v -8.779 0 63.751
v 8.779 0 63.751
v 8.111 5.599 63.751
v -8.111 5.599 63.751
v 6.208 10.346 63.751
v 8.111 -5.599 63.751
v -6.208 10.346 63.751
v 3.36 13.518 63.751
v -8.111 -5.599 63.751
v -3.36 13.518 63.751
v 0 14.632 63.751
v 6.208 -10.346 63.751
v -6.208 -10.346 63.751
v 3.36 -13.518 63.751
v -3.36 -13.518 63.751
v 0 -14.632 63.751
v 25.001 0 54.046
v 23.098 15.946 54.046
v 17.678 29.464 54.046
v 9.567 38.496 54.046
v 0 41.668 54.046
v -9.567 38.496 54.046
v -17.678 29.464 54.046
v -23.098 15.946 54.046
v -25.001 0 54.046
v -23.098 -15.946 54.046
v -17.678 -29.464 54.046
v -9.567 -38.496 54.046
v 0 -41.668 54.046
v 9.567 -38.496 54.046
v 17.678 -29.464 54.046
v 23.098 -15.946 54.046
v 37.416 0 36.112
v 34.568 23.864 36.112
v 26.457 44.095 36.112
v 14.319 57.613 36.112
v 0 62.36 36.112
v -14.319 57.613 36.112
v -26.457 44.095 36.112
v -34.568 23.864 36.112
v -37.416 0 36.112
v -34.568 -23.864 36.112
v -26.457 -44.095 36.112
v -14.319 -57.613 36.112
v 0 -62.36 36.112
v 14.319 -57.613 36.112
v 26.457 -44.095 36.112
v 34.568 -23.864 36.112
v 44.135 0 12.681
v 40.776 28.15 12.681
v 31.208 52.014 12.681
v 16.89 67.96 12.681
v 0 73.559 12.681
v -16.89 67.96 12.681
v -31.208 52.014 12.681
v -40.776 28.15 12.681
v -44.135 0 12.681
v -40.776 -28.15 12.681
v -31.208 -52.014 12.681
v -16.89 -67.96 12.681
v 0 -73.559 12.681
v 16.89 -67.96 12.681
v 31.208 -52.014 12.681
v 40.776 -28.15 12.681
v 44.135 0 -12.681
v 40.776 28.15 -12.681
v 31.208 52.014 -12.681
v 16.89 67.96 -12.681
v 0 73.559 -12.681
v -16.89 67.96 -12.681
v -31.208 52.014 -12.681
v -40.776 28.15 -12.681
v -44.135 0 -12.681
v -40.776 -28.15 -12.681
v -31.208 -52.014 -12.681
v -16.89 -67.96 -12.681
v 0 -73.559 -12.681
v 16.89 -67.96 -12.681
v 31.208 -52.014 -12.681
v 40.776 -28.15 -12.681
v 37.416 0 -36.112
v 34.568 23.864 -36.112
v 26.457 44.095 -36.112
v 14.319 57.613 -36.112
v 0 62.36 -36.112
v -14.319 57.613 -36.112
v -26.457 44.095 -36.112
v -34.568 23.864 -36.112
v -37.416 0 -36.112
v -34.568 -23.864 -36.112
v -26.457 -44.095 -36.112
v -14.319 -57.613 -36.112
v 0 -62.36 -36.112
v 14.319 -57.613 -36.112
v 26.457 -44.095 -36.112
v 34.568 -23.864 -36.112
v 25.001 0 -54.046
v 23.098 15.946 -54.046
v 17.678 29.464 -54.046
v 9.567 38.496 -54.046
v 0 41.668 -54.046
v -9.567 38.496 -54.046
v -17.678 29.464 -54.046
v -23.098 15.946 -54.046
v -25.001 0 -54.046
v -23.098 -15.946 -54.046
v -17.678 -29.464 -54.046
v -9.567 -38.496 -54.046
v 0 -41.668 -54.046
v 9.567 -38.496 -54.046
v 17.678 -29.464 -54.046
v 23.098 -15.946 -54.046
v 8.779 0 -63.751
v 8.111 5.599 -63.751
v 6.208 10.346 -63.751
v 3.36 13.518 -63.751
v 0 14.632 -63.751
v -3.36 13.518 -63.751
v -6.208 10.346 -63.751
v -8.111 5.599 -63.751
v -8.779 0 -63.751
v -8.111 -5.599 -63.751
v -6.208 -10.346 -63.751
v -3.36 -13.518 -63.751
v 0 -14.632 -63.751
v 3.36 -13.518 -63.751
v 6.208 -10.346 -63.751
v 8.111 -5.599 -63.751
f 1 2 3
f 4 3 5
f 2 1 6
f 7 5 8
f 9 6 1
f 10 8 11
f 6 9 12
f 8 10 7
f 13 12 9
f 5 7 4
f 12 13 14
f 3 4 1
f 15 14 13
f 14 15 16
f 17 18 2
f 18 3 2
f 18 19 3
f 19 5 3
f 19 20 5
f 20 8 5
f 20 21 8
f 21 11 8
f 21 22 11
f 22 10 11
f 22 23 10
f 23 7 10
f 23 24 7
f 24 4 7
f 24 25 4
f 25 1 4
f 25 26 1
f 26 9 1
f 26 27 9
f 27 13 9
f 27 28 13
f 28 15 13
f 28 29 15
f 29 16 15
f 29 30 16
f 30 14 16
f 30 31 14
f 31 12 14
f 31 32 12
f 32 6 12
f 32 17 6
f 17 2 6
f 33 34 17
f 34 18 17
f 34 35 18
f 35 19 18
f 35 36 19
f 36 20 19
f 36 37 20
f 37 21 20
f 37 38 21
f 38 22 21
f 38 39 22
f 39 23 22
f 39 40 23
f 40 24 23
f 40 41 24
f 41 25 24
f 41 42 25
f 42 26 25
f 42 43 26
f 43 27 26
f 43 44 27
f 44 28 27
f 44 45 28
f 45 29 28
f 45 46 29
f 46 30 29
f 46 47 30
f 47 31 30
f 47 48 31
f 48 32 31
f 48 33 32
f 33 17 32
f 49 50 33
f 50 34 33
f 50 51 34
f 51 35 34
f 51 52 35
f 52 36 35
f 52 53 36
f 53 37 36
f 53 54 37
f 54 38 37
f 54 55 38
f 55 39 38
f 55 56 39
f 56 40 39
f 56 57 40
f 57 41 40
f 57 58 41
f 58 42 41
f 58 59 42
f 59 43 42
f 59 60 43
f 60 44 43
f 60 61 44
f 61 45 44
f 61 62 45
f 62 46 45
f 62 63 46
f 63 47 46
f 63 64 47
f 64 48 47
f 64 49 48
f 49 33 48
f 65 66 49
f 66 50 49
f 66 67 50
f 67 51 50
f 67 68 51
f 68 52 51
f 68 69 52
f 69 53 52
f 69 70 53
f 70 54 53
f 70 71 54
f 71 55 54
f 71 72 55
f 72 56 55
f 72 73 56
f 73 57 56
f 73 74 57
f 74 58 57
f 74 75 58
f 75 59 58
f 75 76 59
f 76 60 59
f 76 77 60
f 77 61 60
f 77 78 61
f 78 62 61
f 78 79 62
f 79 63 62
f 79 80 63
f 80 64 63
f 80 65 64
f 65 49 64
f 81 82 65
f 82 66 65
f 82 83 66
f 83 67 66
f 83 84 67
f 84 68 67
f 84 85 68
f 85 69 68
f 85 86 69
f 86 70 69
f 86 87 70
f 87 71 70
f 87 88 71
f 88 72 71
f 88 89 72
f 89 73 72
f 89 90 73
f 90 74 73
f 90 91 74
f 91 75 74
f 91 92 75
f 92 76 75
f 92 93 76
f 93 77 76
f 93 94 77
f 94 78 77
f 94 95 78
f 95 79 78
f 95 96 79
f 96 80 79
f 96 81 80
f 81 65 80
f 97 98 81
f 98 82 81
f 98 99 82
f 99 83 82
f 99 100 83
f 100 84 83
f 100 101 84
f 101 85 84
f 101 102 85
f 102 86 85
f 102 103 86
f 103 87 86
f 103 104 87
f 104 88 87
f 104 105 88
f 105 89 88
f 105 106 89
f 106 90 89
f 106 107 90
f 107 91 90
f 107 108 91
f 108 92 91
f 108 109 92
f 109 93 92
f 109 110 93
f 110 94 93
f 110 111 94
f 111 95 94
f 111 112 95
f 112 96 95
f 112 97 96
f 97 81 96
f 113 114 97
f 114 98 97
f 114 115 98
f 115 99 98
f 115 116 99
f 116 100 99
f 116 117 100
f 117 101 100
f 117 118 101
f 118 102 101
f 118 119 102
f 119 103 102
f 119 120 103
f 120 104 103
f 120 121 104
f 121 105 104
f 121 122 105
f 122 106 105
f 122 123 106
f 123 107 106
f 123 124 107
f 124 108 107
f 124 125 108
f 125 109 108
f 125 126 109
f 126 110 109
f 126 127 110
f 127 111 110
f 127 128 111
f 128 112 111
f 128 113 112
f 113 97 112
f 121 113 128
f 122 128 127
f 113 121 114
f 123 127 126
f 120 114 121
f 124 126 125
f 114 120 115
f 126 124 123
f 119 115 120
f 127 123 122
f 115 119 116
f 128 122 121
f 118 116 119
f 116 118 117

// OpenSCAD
// Generated by SolidPython 1.0.1 on 2020-07-29 00:46:49


scale(v = [9, 15, 13]) {
	sphere(r = 5);
}
/***********************************************
*********      SolidPython code:      **********
************************************************
 
# import packages: SolidPython
from solid import *
from solid.utils import *
from itertools import chain, combinations, permutations


class Resize:

    def __init__(self, scad_file):
        self.scad_file = scad_file
        #self.scad_file = import_scad(scad_file)
        # cone/cylinder param:
        self.r1 = 0
        self.r2 = 0
        self.h = 0
        # rectangular prism param:
        self.w = 0
        self.l = 0
        # ellipse param:
        self.r = 0

    # import OpenScad code (file name corresponds to shape)


    # classify shape + parameters
    def assign(self, param1, param2, param3):
        if self.scad_file == 'cone.scad':
            self.r1 = param1
            self.r2 = param2
            self.h = param3
        elif self.scad_file == 'cylinder.scad':
            self.r1 = param1
            self.r2 = param2
            self.h = param3
        elif self.scad_file == 'rectangularPrism.scad':
            self.h = param1
            self.l = param2
            self.w = param3
        else:
            self.r = param1
            self.h = param2

    # resize parameters
    def iterate(self):
        x = range(3, 20, 2)
        i = 1
        if self.scad_file == 'cone.scad':
            tempList = list(permutations(x, 2))
            for temp in tempList:
                param1 = temp[0]
                param2 = temp[1]
                filepath = 'produced_scad_files/' + 'cone' + str(param1) + '_' + str(param2) + '_' + '.scad'
                scad_render_to_file(cylinder(h=param1, r1=param2, r2=0), filepath)

        elif self.scad_file == 'cylinder.scad':
            tempList = list(permutations(x, 3))
            for temp in tempList:
                param1 = temp[0]
                param2 = temp[1]
                filepath = 'produced_scad_files/' + 'cylinder' + str(param1) + '_' + str(param2) + '_' + '.scad'
                scad_render_to_file(cylinder(h=param1, r1=param2, r2=param2), filepath)

        elif self.scad_file == 'rectangularPrism.scad':
            tempList = list(permutations(x, 3))
            for temp in tempList:
                param1 = temp[0]
                param2 = temp[1]
                param3 = temp[2]
                filepath = 'produced_scad_files/' + 'rectangularPrism' + str(param1) + '_' + str(param2) + '_' + str(
                    param3) + '.scad'
                scad_render_to_file(cube(size=(param1, param2, param3)), filepath)

        elif self.scad_file == 'ellipse.scad':
            tempList = list(permutations(x, 4))
            for temp in tempList:
                param1 = temp[0]
                param2 = temp[1]
                param3 = temp[2]
                param4 = temp[3]
                filepath = 'produced_scad_files/' + 'ellipse' + str(param1) + '_' + str(param2) + '_' + str(param3) + '_' + str(param4) + '.scad'
                scad_render_to_file(scale([param1, param2, param3])(sphere(r=param4)), filepath)

    def render_to_scadfile(self):
        scad_render_to_file(scad, 'example.scad') 
 
************************************************/
